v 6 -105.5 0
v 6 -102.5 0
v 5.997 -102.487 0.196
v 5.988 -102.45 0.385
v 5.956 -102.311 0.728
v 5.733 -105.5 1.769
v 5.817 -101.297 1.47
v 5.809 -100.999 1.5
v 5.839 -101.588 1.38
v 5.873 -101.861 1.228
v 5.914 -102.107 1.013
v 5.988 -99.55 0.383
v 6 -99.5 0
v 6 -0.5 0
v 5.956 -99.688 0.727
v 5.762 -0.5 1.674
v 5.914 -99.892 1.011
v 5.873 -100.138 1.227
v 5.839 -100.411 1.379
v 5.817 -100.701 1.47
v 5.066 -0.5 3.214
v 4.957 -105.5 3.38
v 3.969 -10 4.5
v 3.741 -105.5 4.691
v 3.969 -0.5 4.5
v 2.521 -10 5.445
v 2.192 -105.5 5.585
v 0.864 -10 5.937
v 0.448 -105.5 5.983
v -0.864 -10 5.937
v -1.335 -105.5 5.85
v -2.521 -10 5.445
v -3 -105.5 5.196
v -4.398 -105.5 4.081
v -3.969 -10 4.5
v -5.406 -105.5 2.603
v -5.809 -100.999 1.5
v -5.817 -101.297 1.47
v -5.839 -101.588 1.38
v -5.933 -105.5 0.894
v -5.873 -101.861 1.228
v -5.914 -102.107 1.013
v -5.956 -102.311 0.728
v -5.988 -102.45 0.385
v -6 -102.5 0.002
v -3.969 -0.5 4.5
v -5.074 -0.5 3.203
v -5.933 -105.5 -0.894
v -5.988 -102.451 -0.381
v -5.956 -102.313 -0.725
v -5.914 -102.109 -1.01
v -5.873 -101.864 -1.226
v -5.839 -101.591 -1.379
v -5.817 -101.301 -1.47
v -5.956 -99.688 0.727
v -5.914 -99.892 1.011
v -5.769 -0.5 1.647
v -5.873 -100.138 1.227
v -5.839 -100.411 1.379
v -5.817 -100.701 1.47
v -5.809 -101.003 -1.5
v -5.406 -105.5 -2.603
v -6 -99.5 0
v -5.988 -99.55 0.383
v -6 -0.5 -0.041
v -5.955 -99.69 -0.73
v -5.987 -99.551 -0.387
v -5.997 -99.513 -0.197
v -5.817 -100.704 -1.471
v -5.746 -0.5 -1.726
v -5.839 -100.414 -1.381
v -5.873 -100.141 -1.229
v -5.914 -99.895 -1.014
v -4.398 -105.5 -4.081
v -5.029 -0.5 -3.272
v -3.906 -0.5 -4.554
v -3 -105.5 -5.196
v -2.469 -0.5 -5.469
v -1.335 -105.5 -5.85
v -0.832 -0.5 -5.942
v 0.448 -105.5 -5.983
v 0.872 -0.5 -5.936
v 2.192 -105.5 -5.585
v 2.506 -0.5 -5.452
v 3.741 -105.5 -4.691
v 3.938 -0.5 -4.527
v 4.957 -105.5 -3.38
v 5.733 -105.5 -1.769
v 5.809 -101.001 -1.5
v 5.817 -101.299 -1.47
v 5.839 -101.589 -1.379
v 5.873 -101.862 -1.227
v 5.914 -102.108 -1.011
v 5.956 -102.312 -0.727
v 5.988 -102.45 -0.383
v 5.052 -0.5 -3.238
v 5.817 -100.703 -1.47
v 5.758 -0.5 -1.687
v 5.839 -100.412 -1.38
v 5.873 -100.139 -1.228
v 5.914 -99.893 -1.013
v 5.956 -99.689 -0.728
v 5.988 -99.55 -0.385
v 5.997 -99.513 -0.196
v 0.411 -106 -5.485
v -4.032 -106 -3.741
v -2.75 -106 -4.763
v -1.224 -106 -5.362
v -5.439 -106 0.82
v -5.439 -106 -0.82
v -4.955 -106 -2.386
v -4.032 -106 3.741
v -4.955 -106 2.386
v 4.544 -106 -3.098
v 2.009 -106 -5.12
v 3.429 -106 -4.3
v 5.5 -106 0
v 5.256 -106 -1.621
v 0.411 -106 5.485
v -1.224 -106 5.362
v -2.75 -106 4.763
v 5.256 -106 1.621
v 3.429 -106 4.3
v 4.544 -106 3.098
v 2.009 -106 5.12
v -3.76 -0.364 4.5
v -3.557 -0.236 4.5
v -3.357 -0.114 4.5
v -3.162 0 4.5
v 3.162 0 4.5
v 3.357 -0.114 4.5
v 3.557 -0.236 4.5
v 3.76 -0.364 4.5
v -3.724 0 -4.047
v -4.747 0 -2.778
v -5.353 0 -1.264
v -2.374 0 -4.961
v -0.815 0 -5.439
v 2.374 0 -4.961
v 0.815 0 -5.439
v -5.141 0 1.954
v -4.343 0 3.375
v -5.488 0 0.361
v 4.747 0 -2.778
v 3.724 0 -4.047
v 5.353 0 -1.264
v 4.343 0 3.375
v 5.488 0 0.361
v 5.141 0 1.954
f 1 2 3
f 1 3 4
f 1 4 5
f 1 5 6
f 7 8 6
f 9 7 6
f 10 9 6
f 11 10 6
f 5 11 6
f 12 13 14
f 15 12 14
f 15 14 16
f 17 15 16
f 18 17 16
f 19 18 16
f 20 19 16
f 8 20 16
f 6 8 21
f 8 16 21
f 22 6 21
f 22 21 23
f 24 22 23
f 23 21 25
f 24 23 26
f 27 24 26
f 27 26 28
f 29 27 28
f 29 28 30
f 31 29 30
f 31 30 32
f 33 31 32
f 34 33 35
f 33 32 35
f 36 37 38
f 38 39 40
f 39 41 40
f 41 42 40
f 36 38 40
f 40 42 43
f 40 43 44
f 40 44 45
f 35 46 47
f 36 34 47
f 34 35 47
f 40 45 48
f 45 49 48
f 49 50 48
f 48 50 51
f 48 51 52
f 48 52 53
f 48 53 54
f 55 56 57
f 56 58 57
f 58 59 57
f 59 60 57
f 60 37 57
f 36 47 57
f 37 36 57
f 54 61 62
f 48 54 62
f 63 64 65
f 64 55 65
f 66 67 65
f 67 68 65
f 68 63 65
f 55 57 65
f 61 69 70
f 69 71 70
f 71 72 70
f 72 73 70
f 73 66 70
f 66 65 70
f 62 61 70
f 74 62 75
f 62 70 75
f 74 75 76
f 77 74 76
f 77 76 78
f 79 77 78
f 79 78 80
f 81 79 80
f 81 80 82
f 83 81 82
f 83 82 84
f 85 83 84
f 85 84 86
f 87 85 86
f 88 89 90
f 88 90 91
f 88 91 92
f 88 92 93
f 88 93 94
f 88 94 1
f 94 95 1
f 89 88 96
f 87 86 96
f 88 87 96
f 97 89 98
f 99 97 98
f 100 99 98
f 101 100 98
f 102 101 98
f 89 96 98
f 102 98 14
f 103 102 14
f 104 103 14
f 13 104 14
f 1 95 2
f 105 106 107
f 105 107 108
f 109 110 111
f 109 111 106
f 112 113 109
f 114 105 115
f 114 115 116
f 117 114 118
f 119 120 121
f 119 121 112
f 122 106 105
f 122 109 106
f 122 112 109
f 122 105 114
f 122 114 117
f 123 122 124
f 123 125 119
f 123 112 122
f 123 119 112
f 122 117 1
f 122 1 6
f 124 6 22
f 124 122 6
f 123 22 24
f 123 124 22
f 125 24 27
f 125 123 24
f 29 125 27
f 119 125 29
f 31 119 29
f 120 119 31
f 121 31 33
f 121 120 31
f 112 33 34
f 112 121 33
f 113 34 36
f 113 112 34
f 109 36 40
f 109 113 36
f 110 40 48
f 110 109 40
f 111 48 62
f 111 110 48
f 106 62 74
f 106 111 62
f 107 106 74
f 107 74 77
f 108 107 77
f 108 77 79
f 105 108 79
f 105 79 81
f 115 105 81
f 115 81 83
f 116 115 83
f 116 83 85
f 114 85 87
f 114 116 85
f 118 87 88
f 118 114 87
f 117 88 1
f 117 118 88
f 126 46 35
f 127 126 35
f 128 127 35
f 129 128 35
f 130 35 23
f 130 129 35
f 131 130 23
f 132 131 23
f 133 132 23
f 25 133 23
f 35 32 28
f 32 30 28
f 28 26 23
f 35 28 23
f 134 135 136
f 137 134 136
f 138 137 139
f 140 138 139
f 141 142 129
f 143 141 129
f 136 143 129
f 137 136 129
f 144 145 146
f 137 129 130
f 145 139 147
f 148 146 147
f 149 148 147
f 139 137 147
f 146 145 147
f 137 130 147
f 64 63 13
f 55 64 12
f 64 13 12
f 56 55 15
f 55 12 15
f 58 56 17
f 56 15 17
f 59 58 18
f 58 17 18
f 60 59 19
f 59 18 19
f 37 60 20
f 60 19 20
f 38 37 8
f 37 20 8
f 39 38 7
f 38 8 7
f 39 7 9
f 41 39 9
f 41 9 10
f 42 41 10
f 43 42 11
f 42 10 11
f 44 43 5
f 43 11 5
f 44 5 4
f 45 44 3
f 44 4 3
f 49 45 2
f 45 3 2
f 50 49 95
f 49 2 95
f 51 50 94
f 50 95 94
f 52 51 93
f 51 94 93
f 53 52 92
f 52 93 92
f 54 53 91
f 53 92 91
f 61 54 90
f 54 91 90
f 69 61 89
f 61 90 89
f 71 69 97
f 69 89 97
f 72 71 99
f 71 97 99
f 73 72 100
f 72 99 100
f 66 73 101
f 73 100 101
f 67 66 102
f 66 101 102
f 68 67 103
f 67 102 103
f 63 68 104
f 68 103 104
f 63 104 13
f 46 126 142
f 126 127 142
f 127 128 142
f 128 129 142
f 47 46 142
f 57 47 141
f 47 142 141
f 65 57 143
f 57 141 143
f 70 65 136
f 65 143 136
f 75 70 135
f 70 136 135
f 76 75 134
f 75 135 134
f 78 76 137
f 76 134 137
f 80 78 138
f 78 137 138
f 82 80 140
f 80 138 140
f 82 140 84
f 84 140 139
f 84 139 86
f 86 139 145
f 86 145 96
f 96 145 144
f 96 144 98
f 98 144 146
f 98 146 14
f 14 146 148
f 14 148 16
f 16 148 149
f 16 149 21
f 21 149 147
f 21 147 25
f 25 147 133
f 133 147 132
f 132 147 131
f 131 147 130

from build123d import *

# Parameters (mm, degrees)
F0_R     = 6
F1_DEPTH = 106
F2_SIZE  = 0.5
F3_W     = 20
F3_H     = 5
F4_DEPTH = 10
F5_R     = 1.5
F6_DEPTH = 12.5


with BuildPart() as f1:
    # F0 (on Front) → F1 (new body)
    with BuildSketch(Plane.XZ):
        Circle(F0_R)
    extrude(amount=F1_DEPTH)

    # F2
    f2_edges = [f1.edges().sort_by_distance(p)[0] for p in [
        (-6, -106, 0),
        (-6, 0, 0),
    ]]
    chamfer(f2_edges, length=F2_SIZE)

    # F3 (on Front) → F4 (cut)
    with BuildSketch(Plane.XZ):
        with Locations((0, 7)):
            Rectangle(F3_W, F3_H)
    extrude(amount=F4_DEPTH, mode=Mode.SUBTRACT)

    # F5 (on Right) → F6 (cut, symmetric)
    with BuildSketch(Plane.YZ):
        with Locations((-101, 0)):
            Circle(F5_R)
    extrude(amount=F6_DEPTH, both=True, mode=Mode.SUBTRACT)


solid = f1.part
